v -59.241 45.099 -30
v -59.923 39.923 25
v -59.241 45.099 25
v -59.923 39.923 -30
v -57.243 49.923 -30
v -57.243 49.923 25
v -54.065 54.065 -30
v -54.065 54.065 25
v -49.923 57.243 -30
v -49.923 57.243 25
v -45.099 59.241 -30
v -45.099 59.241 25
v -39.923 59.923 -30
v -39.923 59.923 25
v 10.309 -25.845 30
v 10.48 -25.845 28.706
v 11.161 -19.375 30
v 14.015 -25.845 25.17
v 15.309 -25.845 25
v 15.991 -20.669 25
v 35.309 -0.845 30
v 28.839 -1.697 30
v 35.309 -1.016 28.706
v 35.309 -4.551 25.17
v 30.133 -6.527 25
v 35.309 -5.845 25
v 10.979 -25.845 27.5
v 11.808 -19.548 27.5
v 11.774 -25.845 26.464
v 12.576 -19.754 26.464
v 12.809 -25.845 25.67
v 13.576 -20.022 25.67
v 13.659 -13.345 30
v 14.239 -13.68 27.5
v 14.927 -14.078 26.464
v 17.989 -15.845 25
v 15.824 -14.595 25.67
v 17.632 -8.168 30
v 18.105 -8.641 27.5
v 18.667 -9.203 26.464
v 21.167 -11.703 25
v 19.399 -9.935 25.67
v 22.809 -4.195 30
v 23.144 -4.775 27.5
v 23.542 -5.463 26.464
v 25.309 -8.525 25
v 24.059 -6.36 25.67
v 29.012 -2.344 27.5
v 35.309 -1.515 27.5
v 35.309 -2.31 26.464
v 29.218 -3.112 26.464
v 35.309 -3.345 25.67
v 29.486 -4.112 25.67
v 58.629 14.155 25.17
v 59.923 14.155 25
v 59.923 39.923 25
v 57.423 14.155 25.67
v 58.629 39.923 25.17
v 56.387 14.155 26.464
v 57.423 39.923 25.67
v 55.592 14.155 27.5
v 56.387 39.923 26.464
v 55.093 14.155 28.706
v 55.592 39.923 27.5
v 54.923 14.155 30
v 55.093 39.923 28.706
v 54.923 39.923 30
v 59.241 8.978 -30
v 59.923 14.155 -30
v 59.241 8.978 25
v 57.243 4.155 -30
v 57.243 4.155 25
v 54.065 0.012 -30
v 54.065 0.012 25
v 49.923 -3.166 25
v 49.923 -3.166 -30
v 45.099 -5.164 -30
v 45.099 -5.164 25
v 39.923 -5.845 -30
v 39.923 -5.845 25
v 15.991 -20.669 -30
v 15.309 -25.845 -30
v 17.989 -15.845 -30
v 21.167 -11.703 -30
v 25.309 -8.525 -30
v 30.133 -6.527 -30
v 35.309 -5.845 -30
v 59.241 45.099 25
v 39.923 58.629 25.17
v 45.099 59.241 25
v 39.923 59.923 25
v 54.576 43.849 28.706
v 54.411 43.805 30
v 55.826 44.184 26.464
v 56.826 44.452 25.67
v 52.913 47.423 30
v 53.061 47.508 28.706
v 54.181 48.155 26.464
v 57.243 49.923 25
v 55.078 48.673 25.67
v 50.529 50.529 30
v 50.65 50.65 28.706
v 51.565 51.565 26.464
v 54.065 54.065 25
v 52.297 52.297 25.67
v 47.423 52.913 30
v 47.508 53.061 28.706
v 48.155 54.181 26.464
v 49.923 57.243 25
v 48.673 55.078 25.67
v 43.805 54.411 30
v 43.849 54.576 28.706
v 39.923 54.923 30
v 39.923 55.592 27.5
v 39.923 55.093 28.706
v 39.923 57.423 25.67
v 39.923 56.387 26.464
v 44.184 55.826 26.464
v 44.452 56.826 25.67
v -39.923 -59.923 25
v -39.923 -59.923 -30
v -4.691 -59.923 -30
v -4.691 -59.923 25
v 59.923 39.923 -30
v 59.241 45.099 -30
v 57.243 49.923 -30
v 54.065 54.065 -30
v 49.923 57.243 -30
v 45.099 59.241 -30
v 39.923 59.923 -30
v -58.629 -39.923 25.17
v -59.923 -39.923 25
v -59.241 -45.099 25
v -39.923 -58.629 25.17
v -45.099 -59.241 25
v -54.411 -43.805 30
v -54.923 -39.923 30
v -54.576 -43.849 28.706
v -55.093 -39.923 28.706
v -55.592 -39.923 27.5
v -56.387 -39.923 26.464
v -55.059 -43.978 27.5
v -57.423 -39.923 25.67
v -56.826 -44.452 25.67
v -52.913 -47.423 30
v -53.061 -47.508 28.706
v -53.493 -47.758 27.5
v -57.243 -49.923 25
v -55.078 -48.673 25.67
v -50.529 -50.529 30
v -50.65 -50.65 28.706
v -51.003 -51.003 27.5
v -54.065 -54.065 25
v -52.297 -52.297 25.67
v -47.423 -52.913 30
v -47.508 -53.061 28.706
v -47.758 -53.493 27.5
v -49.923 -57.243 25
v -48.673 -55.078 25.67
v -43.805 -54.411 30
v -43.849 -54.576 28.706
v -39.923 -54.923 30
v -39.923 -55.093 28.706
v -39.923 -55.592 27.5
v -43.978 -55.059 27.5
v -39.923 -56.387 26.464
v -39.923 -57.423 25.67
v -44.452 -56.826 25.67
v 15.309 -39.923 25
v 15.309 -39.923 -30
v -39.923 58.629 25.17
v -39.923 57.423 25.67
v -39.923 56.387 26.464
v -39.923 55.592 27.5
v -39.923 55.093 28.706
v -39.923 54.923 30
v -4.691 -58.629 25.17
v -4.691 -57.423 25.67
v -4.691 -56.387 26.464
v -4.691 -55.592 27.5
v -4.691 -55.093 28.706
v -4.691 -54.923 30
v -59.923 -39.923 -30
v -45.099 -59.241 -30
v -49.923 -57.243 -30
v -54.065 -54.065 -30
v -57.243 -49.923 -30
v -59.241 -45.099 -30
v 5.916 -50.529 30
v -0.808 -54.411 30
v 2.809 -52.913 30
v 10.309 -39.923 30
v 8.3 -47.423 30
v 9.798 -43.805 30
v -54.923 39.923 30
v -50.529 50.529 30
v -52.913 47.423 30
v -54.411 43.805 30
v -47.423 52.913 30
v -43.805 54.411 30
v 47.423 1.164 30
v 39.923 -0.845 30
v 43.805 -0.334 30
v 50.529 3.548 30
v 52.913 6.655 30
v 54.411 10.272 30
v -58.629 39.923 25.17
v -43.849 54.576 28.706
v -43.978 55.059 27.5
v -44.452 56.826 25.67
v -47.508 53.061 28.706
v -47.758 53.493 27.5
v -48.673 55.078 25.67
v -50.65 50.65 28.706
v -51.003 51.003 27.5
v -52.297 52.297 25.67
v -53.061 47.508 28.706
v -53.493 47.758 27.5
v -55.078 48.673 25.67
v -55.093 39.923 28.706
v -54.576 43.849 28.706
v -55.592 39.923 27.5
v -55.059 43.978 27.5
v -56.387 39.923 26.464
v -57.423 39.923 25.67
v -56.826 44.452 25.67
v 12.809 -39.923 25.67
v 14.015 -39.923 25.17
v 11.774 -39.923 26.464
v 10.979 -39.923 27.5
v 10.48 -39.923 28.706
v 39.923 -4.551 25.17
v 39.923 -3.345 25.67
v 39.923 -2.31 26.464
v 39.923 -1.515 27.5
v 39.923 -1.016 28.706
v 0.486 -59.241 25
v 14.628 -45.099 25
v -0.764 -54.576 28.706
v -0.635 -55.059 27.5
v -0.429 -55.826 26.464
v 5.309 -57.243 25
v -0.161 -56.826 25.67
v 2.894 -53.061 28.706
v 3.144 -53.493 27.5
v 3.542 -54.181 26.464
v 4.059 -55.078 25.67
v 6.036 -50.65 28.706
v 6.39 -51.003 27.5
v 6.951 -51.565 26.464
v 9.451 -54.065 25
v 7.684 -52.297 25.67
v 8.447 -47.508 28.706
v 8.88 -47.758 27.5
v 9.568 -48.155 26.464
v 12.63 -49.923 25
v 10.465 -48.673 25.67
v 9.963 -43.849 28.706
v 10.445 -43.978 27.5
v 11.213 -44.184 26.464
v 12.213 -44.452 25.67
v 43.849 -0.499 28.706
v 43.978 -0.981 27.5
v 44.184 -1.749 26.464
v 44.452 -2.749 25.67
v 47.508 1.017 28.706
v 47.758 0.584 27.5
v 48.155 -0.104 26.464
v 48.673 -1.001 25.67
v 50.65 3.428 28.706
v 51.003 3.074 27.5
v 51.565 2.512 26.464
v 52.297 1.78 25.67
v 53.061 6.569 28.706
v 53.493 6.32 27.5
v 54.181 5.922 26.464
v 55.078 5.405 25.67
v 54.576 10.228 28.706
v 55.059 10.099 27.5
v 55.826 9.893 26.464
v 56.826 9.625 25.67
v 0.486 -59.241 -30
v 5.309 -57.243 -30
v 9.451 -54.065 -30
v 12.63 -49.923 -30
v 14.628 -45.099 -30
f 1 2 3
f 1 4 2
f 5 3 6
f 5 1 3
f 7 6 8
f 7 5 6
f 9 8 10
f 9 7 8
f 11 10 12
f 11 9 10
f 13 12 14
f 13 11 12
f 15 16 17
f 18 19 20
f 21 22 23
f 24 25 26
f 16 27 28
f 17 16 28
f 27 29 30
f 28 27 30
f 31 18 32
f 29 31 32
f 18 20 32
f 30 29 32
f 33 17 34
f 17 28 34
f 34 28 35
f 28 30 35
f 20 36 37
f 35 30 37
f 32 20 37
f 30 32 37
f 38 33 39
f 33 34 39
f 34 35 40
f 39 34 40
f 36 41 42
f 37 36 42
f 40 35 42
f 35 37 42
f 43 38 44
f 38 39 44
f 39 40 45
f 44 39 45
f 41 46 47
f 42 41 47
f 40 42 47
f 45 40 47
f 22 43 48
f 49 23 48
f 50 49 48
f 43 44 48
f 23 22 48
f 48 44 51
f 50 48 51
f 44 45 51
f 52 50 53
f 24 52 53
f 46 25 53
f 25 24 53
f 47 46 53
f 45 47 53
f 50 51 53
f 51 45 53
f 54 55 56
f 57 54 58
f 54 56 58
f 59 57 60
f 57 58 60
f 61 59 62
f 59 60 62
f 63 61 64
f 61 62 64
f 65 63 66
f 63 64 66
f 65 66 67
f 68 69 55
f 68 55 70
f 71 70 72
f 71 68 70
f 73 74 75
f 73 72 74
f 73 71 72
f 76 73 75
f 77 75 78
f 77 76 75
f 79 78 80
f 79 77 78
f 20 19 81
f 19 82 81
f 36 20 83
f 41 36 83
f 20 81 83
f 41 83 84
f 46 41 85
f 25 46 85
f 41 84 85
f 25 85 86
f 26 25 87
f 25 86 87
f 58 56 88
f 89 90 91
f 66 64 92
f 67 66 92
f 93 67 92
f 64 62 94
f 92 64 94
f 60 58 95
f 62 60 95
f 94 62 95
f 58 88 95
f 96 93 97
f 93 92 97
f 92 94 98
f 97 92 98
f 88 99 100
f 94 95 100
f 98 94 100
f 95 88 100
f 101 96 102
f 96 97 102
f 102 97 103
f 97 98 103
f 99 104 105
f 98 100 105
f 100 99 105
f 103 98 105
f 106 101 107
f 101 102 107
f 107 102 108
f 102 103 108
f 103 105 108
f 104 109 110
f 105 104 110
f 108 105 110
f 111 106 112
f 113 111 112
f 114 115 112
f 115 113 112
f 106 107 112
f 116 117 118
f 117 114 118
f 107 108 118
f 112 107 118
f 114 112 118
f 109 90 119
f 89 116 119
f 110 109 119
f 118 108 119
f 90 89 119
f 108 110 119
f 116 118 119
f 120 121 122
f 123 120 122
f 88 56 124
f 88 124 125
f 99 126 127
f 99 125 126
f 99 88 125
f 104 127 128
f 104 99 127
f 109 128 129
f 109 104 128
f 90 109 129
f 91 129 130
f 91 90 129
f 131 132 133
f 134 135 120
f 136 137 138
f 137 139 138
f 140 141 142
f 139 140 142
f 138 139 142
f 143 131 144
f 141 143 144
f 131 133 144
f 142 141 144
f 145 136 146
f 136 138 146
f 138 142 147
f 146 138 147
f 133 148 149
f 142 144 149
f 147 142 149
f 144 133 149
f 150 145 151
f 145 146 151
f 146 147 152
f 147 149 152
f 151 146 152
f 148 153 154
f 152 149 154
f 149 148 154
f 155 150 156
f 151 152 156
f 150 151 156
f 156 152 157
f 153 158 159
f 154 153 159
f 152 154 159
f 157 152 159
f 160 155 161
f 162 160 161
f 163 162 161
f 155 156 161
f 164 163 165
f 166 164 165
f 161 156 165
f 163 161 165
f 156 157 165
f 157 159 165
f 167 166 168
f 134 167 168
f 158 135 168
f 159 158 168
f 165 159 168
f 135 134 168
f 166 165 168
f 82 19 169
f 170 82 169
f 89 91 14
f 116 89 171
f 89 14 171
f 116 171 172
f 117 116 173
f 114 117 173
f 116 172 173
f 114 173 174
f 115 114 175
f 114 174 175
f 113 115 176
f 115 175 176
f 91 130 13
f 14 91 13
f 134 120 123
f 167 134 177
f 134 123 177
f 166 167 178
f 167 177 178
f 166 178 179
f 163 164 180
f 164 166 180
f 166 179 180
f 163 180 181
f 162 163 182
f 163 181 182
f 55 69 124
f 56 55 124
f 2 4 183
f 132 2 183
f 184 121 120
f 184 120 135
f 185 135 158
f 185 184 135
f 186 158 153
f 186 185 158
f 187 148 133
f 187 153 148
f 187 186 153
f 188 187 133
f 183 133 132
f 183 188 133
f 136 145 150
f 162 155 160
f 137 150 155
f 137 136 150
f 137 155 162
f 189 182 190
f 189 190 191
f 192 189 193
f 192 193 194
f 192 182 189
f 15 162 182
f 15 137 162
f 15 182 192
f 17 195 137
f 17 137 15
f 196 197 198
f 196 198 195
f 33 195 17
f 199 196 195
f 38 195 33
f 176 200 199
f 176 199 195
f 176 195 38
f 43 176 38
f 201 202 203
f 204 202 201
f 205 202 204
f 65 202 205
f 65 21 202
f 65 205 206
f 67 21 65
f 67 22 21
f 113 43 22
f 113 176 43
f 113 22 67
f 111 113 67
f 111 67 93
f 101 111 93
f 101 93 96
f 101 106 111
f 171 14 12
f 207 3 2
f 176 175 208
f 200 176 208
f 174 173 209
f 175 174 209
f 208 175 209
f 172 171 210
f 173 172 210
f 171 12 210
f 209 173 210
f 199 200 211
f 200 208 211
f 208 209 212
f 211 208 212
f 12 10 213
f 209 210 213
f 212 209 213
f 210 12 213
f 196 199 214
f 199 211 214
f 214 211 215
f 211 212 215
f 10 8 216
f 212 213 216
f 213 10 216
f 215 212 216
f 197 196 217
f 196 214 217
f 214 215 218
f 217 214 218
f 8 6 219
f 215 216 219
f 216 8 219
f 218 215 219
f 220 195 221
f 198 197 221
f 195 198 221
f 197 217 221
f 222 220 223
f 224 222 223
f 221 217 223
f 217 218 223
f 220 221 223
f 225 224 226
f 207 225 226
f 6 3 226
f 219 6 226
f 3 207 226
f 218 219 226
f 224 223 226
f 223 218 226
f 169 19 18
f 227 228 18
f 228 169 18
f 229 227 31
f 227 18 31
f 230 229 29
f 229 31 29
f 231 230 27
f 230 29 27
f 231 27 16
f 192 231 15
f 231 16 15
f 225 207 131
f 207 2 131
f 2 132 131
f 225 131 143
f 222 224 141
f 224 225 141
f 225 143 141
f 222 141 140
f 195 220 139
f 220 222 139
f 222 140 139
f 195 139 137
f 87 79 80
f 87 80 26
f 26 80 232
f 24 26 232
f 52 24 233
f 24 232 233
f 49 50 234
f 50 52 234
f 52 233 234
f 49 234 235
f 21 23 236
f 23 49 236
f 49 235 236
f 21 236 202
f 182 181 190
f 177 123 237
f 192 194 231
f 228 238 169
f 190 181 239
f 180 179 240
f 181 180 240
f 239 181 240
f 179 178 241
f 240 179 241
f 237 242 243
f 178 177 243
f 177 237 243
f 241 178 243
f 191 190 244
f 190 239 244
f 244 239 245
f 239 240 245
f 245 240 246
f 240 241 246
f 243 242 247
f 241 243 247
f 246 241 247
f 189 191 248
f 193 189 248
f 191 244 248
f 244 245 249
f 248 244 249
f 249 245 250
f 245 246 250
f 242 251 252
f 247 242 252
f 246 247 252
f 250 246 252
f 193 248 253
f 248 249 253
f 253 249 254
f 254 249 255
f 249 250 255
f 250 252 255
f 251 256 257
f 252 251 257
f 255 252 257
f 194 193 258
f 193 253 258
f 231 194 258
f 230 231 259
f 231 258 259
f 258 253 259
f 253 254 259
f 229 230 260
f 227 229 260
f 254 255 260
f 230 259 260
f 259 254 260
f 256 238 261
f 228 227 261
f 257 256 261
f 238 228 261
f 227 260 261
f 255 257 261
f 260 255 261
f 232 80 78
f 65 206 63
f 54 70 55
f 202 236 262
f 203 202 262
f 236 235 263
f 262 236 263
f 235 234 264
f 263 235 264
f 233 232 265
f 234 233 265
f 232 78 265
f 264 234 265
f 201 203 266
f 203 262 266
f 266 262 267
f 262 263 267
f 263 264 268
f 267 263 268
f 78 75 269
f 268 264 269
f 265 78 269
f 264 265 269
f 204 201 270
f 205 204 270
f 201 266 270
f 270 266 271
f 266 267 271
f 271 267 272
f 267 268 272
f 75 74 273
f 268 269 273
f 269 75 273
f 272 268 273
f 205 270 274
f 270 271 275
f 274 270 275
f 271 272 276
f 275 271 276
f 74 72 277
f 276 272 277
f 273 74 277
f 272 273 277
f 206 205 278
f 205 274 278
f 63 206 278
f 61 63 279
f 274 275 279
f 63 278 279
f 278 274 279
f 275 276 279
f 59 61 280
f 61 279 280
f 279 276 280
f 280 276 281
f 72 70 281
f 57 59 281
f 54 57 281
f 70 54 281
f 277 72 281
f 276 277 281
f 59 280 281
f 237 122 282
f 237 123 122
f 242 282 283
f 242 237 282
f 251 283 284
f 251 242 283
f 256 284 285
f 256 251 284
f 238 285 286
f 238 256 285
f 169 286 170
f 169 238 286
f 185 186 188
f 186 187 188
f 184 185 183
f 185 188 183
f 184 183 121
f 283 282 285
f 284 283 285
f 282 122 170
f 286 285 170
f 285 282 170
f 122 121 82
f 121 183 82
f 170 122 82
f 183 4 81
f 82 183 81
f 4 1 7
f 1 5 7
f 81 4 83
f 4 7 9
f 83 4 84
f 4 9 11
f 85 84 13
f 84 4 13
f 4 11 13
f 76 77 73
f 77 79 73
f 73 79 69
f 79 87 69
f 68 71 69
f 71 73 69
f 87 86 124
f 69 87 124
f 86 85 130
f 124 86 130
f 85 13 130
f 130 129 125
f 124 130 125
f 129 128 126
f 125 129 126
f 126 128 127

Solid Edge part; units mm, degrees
sketch "Sketch1" plane through (0, 0, 0) normal (0, 0, 1) x (1, 0, 0)
  line L0 (-59.9226, -59.9226) -> (59.9226, -59.9226)
  line L1 (59.9226, -59.9226) -> (59.9226, 59.9226)
  line L2 (59.9226, 59.9226) -> (-59.9226, 59.9226)
  line L3 (-59.9226, 59.9226) -> (-59.9226, -59.9226)
extrude "Protrusion1" add sketch "Sketch1" along normal mid plane 60
sketch "Sketch2" plane through (0, 0, 30) normal (0, 0, 1) x (1, 0, 0)
  line L0 (69.8659, -5.8454) -> (15.3093, -5.8454)
  line L1 (15.3093, -5.8454) -> (15.3093, -68.7525)
extrude "Cutout1" cut sketch "Sketch2" against normal through all material side at (42.5876, -5.8954, 30)
fillet "Round_1" radius 20 6 edges at (-59.9226, -59.9226, 0) (-59.9226, 59.9226, 0) (15.3093, -5.8454, 0) (15.3093, -59.9226, 0) (59.9226, -5.8454, 0) (59.9226, 59.9226, 0)
sketch "Sketch3" plane through (15.3093, -39.9226, 30) normal (0, -1, 0) x (1, 0, 0)
  circle A0 centre (0, 0) radius 5
  dimension "D1" = 10
sketch3d "SweptCutout1 path"
  arc A0 (-4.6907, -59.9226, 30) -> (15.3093, -39.9226, 30) centre (-4.6907, -39.9226, 30)
  line L1 (15.3093, -25.8454, 30) -> (15.3093, -39.9226, 30)
  arc A2 (15.3093, -25.8454, 30) -> (35.3093, -5.8454, 30) centre (35.3093, -25.8454, 30)
  line L3 (39.9226, -5.8454, 30) -> (35.3093, -5.8454, 30)
  arc A4 (59.9226, 14.1546, 30) -> (39.9226, -5.8454, 30) centre (39.9226, 14.1546, 30)
  line L5 (59.9226, 14.1546, 30) -> (59.9226, 39.9226, 30)
  arc A6 (39.9226, 59.9226, 30) -> (59.9226, 39.9226, 30) centre (39.9226, 39.9226, 30)
  line L7 (39.9226, 59.9226, 30) -> (-39.9226, 59.9226, 30)
  arc A8 (-59.9226, 39.9226, 30) -> (-39.9226, 59.9226, 30) centre (-39.9226, 39.9226, 30)
  line L9 (-59.9226, 39.9226, 30) -> (-59.9226, -39.9226, 30)
  arc A10 (-39.9226, -59.9226, 30) -> (-59.9226, -39.9226, 30) centre (-39.9226, -39.9226, 30)
  line L11 (-39.9226, -59.9226, 30) -> (-4.6907, -59.9226, 30)
sweep "SweptCutout1" cut profiles "Sketch3" path "SweptCutout1 path"
